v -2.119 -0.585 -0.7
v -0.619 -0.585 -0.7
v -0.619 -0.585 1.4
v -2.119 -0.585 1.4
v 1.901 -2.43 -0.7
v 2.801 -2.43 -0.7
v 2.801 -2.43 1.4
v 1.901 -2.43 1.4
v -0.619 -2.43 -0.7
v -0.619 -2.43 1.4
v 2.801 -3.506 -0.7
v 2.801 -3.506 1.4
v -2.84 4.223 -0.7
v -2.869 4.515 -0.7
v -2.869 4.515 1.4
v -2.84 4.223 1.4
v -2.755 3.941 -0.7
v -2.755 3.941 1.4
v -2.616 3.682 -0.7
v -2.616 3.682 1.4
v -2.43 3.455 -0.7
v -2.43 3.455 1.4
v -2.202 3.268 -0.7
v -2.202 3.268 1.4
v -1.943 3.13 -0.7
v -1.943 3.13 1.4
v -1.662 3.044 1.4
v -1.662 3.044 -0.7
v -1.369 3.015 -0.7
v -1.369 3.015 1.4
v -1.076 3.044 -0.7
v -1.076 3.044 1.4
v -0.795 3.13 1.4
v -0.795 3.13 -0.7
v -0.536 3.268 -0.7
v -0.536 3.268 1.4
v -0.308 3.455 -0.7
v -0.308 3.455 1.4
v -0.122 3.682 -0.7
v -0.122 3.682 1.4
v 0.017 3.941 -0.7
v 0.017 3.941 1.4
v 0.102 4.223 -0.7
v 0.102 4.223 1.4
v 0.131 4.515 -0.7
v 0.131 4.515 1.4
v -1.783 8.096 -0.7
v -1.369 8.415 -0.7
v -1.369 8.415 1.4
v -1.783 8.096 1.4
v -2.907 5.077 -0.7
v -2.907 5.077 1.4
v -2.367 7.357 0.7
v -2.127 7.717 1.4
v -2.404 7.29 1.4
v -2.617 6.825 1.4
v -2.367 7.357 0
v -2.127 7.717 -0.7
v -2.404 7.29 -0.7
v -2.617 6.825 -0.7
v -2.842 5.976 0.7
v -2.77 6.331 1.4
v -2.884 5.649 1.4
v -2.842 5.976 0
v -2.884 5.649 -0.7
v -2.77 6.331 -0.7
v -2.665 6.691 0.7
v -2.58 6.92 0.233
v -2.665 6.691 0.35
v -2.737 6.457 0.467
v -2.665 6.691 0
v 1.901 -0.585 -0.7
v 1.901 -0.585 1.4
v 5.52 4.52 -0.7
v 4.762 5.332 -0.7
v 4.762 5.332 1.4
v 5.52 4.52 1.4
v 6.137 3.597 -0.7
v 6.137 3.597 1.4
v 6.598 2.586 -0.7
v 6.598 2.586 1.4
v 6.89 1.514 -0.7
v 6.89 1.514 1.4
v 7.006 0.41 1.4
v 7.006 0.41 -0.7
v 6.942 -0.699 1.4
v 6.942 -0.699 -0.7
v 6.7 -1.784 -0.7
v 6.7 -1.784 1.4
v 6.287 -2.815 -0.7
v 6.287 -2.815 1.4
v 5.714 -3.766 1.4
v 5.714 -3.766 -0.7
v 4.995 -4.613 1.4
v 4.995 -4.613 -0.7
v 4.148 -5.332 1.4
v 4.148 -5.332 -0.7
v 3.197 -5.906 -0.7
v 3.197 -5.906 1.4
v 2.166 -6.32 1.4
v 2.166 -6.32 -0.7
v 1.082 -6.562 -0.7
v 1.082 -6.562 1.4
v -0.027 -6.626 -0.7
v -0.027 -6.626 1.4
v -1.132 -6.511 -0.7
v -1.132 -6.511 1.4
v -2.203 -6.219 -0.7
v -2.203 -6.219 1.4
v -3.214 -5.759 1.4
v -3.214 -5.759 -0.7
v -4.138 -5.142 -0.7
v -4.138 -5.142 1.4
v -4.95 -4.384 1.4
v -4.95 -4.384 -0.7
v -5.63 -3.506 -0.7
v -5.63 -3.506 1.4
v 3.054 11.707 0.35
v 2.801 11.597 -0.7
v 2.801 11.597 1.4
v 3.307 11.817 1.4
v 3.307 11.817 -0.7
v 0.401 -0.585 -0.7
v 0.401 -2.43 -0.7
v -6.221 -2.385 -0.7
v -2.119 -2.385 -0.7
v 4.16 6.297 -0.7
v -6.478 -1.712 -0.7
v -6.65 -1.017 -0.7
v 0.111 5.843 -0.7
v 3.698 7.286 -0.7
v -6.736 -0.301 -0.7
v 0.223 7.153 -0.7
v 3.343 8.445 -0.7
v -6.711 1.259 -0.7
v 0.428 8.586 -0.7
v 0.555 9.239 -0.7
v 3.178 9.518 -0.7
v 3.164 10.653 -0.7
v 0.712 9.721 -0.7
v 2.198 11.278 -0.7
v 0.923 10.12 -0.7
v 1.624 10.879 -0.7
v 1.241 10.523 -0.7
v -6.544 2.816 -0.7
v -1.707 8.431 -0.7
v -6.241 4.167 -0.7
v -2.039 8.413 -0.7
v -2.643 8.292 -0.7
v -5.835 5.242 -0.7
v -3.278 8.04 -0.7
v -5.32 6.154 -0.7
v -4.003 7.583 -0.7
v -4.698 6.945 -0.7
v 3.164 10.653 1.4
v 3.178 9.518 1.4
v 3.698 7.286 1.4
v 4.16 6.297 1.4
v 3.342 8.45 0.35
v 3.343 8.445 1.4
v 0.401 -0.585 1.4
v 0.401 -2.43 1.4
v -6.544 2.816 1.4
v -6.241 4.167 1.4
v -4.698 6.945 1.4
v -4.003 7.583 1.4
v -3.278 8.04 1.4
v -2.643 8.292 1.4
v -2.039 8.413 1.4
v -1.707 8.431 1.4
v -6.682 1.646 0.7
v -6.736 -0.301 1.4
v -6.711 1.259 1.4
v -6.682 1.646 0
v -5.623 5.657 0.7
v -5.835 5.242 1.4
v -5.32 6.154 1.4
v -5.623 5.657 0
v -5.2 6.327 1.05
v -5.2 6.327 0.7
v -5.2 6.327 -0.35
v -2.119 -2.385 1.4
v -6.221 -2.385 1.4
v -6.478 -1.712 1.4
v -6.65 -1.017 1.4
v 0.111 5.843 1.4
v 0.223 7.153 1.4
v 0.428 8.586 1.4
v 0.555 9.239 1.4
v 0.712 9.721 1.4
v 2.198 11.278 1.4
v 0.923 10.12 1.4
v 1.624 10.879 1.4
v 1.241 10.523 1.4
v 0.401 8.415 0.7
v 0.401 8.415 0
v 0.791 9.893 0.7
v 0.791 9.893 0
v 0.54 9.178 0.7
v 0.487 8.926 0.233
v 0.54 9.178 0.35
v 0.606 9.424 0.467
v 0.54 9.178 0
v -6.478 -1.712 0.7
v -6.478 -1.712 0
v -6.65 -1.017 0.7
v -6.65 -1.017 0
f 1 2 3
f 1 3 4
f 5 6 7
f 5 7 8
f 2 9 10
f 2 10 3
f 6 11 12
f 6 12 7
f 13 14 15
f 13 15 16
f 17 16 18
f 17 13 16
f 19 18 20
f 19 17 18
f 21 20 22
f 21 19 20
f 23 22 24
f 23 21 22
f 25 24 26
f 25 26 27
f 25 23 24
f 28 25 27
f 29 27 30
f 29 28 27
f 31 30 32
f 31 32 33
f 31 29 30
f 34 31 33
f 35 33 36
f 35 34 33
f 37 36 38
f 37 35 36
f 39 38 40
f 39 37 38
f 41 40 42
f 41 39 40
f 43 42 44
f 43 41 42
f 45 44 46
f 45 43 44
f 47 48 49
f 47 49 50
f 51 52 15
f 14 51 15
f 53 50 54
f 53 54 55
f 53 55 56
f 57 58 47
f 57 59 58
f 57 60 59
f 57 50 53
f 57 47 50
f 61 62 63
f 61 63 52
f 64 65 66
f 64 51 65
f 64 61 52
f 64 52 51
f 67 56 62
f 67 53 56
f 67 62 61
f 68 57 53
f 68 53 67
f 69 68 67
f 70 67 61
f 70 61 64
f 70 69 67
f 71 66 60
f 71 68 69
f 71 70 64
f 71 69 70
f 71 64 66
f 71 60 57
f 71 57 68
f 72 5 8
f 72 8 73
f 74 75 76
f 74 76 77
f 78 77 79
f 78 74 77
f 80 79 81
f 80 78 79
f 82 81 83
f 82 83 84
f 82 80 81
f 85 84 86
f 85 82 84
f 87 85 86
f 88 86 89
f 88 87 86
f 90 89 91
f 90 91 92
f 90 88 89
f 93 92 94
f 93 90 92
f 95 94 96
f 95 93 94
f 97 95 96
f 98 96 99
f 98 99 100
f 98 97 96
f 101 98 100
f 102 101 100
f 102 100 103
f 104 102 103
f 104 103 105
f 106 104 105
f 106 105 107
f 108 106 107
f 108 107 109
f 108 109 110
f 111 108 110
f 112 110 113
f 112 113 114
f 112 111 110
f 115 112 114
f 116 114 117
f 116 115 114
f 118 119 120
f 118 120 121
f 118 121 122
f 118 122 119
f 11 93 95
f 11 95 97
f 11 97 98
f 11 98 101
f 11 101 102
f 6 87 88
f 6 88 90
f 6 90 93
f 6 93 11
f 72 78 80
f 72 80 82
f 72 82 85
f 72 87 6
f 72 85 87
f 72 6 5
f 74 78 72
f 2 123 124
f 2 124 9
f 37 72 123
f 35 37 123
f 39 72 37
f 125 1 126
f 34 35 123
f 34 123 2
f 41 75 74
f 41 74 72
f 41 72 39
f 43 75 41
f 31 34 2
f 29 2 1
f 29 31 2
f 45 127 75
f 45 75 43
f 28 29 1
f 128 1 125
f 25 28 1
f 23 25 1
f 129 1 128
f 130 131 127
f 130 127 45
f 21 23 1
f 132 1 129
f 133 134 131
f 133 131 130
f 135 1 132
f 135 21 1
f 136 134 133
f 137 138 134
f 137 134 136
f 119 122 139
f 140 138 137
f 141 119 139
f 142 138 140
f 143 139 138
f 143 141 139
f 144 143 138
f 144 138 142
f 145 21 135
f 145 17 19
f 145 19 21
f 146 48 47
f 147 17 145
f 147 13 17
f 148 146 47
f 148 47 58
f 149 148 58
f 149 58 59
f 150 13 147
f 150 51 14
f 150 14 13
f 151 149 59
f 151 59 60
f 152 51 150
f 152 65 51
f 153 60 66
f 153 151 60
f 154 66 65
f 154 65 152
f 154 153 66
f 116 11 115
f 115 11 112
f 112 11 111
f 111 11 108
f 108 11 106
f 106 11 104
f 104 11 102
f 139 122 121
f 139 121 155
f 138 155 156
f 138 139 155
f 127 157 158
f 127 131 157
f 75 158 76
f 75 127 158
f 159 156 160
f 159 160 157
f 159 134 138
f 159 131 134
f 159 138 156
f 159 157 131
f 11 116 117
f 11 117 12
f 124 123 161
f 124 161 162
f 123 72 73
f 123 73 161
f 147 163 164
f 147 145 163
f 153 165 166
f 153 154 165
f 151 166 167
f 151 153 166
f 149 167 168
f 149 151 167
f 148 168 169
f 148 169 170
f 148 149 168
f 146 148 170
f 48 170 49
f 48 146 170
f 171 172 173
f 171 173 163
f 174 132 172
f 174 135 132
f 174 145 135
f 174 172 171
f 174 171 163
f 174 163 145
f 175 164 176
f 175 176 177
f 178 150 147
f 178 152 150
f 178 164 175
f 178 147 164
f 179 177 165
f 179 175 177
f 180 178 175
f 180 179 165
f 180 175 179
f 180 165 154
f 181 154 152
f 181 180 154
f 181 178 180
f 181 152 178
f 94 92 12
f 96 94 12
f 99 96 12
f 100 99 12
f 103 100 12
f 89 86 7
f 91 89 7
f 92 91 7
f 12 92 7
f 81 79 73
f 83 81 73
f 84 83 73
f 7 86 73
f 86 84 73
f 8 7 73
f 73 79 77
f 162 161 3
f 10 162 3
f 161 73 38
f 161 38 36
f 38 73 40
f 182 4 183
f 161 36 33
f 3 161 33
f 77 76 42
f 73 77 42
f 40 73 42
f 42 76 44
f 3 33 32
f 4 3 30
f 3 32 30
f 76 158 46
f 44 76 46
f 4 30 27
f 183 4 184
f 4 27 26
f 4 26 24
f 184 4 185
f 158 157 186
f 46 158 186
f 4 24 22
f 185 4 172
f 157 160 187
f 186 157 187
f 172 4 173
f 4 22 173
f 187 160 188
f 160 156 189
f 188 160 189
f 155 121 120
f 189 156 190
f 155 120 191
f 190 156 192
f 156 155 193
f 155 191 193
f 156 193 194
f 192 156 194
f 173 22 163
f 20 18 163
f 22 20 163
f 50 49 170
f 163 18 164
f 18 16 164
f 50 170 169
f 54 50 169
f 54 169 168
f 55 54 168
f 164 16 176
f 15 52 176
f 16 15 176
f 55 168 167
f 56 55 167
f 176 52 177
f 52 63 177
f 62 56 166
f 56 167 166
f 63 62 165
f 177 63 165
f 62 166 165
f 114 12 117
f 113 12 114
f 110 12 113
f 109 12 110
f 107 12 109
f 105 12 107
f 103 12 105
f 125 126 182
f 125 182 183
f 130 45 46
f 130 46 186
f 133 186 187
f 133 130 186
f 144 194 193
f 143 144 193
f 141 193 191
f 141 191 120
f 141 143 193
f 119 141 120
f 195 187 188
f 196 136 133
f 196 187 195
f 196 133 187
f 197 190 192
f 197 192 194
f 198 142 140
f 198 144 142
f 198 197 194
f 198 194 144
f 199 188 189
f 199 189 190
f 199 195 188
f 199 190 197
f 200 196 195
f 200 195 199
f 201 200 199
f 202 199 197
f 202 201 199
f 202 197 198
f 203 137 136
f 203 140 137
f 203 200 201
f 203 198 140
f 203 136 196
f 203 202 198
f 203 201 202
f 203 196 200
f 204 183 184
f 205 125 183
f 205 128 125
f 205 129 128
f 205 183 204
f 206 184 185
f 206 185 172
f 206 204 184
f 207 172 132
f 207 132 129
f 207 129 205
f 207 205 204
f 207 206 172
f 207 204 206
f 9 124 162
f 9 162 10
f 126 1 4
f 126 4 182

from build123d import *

# Parameters (mm, degrees)
BOSS_EXTRUDE1_DEPTH = 0.7
SCALE1_SCALE        = 3


with BuildPart() as part:
    # Sketch1 → Boss-Extrude1 (new body)
    with BuildSketch(Plane.XY):
        with BuildLine():
            add(Edge.make_bspline(
                [(1.308612852, 4.749134037), (1.089185384, 3.585197579), (1.793550911, 2.587518606)],
                knots=[0, 0, 0, 1, 1, 1], degree=2))
            ThreePointArc((1.793550911, 2.587518606), (1.734959229, -0.853049688), (-1.670369344, -0.358397807))
            Line((-1.670369344, -0.358397807), (1.14, -0.358397807))
            Line((1.14, -0.358397807), (1.14, 0))
            Line((1.14, 0), (0.84, 0))
            Line((0.84, 0), (0.84, 0.615282796))
            Line((0.84, 0.615282796), (0.34, 0.615282796))
            Line((0.34, 0.615282796), (0.34, 0))
            Line((0.34, 0), (0, 0))
            Line((0, 0), (0, 0.615282796))
            Line((0, 0.615282796), (-0.5, 0.615282796))
            Line((-0.5, 0.615282796), (-0.5, 0.015282796))
            Line((-0.5, 0.015282796), (-1.86741437, 0.015282796))
            add(Edge.make_bspline(
                [(-1.86741437, 0.015282796), (-1.967195235, 0.235858372), (-2.024440964, 0.467418027), (-2.039152584, 0.709940467)],
                knots=[0, 0, 0, 0, 0.800781106, 0.800781106, 0.800781106, 0.800781106], degree=3))
            add(Edge.make_bspline(
                [(-2.039152584, 0.709940467), (-2.047148733, 0.925627975), (-2.02218467, 1.604112941), (-1.789435207, 2.864813182), (-0.855181509, 3.674882666), (-0.25, 3.615282796)],
                knots=[0.156243254, 0.156243254, 0.156243254, 0.156243254, 0.300823298, 0.609121374, 1, 1, 1, 1], degree=3))
            add(Edge.make_bspline(
                [(-0.25, 3.615282796), (-0.677964438, 3.343186963), (-0.807483326, 2.788196328), (-0.75, 2.315282796)],
                knots=[0, 0, 0, 0, 1, 1, 1, 1], degree=3))
            ThreePointArc((-0.75, 2.315282796), (-0.25, 1.815282796), (0.25, 2.315282796))
            add(Edge.make_bspline(
                [(0.25, 2.315282796), (0.215460935, 2.756941027), (0.29493392, 3.342860109), (0.442449357, 4.258464168), (0.878924002, 4.555096789), (1.14, 4.675619868)],
                knots=[0, 0, 0, 0, 0.483638441, 0.672292201, 1, 1, 1, 1], degree=3))
            add(Edge.make_bspline(
                [(1.14, 4.675619868), (1.224306426, 4.712376952), (1.308612852, 4.749134037)],
                knots=[0, 0, 0, 0.865241942, 0.865241942, 0.865241942], degree=2))
        make_face()
    extrude(amount=BOSS_EXTRUDE1_DEPTH)


with BuildPart() as part_1:
    # Scale1: scaled about (0.30944177, 1.215178074, 0.35)
    add(part.part.scale(SCALE1_SCALE).moved(Location((-0.61888354, -2.430356148, -0.7))))


solid = part_1.part
